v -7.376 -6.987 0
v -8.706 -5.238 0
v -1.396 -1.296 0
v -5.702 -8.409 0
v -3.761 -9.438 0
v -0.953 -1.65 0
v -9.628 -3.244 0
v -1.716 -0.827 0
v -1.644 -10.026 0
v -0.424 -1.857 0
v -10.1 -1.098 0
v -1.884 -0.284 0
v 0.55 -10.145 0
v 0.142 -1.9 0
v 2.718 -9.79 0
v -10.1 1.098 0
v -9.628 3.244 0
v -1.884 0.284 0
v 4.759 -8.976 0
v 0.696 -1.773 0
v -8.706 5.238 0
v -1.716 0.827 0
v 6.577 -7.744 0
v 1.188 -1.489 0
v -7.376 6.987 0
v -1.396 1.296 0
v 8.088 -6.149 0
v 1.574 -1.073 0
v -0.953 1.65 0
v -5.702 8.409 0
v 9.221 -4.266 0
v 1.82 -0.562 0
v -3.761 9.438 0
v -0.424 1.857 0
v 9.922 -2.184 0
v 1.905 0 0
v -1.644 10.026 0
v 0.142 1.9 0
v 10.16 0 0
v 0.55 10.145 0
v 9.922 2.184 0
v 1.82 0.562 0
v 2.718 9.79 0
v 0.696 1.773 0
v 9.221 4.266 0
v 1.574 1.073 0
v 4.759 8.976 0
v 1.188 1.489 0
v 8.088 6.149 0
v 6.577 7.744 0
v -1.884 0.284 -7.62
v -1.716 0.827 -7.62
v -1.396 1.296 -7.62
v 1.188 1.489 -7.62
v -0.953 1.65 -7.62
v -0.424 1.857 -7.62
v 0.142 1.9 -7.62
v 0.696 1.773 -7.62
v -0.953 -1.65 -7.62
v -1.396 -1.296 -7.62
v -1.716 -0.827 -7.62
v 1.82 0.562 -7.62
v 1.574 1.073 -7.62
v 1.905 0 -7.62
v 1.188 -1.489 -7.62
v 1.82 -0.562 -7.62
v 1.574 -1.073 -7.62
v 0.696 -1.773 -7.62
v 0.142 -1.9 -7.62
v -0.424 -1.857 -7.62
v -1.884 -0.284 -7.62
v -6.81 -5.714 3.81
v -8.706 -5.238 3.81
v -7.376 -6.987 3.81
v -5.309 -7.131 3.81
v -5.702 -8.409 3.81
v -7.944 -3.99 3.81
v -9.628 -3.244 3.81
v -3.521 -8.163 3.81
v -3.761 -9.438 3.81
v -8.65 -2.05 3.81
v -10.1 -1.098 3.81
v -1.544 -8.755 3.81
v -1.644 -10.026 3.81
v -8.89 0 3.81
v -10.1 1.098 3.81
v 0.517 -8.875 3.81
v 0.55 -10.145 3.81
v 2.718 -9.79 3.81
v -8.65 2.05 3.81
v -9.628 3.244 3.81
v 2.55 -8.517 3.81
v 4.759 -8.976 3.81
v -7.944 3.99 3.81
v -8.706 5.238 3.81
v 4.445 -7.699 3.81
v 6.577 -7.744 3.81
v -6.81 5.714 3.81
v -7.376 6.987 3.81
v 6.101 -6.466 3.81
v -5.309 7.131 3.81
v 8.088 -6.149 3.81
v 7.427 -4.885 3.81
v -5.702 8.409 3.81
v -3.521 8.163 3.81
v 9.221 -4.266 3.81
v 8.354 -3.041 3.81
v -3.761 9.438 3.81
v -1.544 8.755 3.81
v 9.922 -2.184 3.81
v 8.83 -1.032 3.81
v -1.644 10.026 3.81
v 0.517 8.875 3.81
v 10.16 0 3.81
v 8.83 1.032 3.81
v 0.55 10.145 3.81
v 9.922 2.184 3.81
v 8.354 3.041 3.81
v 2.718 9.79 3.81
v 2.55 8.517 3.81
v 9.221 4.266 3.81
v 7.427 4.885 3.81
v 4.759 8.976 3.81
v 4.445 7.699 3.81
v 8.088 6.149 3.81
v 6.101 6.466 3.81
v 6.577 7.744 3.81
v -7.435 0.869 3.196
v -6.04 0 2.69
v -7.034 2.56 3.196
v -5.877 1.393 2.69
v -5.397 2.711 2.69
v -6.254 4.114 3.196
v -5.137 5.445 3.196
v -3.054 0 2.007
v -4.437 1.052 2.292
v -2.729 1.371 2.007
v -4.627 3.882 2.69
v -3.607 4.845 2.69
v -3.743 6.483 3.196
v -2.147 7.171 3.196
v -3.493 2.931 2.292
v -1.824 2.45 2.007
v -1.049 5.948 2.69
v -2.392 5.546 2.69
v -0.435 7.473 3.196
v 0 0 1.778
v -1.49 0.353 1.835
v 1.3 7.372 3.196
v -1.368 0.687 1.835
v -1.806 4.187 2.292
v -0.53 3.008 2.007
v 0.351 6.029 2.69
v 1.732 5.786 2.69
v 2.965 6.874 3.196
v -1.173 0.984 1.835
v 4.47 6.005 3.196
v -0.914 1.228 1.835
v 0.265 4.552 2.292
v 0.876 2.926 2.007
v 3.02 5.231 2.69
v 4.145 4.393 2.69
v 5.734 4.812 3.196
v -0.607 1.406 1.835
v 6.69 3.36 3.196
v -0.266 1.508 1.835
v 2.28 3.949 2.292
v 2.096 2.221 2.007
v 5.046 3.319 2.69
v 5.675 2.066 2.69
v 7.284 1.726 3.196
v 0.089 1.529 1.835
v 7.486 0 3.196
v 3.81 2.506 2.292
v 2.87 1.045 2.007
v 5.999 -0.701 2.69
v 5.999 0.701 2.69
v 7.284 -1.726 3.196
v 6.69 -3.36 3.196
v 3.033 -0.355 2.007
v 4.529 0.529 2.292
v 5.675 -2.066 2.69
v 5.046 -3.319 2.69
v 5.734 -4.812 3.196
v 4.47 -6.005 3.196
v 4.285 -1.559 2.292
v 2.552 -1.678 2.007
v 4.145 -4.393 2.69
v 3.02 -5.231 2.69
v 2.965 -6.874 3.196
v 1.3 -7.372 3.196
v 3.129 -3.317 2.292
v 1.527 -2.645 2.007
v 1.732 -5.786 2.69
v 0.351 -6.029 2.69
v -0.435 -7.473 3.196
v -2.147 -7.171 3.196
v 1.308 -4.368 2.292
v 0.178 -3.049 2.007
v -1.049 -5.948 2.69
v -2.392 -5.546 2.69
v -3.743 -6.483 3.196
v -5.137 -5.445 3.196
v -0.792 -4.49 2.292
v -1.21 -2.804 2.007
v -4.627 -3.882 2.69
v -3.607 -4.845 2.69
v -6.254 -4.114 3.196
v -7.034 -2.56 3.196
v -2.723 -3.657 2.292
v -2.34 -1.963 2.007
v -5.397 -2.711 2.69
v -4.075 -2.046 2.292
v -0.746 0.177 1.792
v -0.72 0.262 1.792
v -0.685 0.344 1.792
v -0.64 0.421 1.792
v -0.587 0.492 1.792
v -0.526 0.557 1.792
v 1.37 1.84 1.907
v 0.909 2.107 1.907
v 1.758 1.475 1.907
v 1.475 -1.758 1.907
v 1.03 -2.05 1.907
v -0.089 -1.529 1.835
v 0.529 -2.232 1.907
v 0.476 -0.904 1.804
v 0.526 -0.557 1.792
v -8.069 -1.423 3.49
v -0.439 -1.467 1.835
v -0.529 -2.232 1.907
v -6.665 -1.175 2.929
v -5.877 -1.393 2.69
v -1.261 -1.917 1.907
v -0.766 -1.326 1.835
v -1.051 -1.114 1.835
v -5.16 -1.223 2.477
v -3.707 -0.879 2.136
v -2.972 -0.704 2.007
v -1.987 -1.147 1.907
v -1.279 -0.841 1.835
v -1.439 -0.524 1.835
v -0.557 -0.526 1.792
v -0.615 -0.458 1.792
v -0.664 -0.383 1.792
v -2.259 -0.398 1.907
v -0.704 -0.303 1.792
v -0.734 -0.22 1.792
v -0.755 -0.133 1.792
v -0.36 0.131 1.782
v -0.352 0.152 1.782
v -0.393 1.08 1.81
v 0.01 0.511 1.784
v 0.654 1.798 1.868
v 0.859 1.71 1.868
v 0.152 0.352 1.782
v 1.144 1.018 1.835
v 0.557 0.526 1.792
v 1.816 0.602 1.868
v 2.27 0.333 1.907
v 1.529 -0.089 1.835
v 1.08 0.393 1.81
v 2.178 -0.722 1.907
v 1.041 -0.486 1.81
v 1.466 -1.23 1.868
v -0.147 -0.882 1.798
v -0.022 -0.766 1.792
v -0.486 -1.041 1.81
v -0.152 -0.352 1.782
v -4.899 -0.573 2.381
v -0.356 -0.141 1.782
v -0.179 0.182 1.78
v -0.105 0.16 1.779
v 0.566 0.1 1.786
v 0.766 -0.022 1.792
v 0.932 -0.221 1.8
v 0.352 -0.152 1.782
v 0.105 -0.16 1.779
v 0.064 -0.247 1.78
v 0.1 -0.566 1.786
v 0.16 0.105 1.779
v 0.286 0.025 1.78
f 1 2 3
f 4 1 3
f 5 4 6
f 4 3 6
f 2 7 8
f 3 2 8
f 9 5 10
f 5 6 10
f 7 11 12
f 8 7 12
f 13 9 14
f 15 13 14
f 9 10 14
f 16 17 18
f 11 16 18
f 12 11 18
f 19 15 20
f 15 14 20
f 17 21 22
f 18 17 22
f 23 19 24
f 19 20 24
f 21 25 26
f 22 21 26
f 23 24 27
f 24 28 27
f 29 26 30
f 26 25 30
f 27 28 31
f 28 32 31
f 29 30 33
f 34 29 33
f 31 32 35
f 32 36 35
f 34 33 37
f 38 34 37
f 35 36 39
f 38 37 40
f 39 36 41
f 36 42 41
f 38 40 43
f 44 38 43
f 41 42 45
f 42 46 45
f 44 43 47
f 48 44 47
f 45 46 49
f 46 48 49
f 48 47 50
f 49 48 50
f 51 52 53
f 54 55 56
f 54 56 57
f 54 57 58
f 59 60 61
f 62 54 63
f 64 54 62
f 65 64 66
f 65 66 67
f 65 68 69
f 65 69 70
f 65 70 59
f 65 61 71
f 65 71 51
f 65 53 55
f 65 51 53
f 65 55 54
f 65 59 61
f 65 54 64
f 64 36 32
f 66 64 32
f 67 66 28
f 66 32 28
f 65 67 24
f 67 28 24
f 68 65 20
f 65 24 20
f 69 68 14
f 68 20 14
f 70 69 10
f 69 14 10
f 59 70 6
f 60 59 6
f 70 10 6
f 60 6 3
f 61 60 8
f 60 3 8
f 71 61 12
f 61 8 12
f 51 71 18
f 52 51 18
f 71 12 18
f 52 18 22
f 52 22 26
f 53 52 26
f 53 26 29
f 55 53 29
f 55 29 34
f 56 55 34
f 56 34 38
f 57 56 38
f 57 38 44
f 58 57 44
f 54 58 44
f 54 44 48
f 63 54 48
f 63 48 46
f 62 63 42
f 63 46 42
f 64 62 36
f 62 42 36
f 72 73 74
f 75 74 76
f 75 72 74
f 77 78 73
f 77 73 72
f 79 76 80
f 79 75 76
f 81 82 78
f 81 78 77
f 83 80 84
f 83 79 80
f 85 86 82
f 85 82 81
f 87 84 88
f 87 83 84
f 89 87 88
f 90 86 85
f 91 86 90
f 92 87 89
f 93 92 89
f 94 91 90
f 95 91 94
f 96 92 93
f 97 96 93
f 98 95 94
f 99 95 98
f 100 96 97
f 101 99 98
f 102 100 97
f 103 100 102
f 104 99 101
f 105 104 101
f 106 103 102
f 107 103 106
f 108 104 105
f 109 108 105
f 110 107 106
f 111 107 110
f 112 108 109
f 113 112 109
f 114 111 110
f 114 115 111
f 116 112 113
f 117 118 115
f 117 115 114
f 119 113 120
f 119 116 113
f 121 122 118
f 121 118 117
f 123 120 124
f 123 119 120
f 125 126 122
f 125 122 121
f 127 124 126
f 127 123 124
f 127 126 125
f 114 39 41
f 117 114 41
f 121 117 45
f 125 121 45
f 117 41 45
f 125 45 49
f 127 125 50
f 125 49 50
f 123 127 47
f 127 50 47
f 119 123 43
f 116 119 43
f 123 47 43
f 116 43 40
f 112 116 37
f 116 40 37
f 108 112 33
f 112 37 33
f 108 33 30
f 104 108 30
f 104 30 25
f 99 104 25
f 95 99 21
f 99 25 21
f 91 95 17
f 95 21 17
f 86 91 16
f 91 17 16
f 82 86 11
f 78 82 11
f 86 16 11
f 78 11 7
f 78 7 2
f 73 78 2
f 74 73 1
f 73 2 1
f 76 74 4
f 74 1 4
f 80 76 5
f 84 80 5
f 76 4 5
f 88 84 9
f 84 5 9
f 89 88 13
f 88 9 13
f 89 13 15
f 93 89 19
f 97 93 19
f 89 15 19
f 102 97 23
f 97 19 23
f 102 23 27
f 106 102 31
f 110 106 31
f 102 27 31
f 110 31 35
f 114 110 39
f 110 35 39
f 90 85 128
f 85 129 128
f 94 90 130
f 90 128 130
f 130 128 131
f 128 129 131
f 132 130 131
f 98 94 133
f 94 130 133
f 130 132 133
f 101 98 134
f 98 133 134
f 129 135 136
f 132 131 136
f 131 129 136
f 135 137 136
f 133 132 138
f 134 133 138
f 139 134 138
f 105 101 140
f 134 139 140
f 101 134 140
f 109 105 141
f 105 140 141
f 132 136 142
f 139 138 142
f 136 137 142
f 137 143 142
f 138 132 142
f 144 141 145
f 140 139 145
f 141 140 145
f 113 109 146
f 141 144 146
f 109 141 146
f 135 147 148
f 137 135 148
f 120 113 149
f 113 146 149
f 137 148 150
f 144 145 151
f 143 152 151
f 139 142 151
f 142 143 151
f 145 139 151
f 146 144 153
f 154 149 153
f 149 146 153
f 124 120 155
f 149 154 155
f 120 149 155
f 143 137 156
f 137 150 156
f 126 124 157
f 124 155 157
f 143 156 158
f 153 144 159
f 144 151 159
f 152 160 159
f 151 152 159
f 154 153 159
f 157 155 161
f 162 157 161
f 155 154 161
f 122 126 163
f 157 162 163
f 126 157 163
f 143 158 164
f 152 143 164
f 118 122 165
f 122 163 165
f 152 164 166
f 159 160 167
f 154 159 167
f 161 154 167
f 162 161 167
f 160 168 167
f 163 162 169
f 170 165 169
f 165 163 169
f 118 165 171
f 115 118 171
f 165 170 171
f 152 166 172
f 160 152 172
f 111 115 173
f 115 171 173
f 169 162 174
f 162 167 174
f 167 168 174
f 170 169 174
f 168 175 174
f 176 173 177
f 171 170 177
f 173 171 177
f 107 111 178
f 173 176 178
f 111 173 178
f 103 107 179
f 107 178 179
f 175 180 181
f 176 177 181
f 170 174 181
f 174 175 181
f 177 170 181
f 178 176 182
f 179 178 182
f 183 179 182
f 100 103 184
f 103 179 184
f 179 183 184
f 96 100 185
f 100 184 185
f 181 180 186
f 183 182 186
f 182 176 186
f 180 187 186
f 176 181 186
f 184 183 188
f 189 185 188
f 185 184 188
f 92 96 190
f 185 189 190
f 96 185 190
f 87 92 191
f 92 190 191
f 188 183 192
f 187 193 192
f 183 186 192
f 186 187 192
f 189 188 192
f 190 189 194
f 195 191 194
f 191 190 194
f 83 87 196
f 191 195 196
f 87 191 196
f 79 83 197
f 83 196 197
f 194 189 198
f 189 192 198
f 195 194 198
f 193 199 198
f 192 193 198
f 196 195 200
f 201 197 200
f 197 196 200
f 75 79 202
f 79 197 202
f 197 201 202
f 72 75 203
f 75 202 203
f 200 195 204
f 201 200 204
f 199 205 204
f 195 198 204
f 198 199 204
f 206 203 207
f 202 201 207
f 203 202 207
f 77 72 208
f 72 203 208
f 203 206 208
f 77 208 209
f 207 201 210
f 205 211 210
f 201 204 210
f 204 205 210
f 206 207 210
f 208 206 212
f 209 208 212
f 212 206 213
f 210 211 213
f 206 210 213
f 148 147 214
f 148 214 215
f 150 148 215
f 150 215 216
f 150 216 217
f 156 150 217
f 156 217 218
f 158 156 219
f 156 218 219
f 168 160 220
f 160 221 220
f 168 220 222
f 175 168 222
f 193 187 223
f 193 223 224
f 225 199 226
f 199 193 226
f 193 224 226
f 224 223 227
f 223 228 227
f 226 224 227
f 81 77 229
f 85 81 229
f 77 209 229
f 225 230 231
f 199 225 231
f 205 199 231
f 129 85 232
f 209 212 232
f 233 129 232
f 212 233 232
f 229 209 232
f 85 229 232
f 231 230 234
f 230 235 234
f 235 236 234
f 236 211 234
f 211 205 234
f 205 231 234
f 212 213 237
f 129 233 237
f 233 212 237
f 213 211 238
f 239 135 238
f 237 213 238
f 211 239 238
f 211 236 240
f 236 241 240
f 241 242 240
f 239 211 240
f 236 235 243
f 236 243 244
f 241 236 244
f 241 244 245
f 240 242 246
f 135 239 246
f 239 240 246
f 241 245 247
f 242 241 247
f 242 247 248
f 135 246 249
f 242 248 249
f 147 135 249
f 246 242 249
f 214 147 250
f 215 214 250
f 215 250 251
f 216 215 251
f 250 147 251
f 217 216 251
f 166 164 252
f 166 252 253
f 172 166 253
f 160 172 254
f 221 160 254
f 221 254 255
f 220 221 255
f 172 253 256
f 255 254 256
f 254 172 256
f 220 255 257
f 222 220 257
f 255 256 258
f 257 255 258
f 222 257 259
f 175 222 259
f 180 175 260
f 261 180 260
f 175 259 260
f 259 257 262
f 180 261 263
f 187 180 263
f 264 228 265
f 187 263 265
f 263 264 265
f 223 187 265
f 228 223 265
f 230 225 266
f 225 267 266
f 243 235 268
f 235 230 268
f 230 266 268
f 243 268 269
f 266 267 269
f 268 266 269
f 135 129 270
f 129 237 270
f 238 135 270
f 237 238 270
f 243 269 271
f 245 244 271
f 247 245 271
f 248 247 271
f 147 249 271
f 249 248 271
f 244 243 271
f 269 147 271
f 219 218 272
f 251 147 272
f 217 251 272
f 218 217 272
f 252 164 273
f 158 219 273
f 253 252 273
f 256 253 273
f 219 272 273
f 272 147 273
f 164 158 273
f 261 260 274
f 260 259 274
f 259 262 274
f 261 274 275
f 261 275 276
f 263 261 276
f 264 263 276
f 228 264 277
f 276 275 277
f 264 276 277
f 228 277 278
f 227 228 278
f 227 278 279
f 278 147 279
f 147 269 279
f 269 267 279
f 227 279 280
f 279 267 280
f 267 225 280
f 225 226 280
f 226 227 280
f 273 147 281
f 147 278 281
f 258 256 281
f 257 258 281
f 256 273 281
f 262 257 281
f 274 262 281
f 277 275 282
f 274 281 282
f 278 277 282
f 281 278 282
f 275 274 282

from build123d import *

# Parameters (mm, degrees)
F0_R     = 10.16
F1_DEPTH = 3.81
F4_R     = 1.905
F5_DEPTH = 7.62


with BuildPart() as f1:
    # F0 (on Top) → F1 (new body)
    with BuildSketch(Plane.XY):
        Circle(F0_R)
    extrude(amount=F1_DEPTH)

    # F2 (on Front) → F3 (revolve, cut)
    with BuildSketch(Plane.XZ):
        with BuildLine():
            Line((0, 3.81), (-8.89, 3.81))
            ThreePointArc((-8.89, 3.81), (-4.559636, 2.292467), (0, 1.778))
            Line((0, 1.778), (0, 3.81))
        make_face()
    revolve(axis=Axis((0, 0, 2.794), (0, 0, -1)), mode=Mode.SUBTRACT)

    # F4 (on face) → F5 (join)
    with BuildSketch(Plane(origin=(0, 0, 0), x_dir=(1, 0, 0), z_dir=(0, 0, -1))):
        Circle(F4_R)
    extrude(amount=F5_DEPTH)


solid = f1.part
